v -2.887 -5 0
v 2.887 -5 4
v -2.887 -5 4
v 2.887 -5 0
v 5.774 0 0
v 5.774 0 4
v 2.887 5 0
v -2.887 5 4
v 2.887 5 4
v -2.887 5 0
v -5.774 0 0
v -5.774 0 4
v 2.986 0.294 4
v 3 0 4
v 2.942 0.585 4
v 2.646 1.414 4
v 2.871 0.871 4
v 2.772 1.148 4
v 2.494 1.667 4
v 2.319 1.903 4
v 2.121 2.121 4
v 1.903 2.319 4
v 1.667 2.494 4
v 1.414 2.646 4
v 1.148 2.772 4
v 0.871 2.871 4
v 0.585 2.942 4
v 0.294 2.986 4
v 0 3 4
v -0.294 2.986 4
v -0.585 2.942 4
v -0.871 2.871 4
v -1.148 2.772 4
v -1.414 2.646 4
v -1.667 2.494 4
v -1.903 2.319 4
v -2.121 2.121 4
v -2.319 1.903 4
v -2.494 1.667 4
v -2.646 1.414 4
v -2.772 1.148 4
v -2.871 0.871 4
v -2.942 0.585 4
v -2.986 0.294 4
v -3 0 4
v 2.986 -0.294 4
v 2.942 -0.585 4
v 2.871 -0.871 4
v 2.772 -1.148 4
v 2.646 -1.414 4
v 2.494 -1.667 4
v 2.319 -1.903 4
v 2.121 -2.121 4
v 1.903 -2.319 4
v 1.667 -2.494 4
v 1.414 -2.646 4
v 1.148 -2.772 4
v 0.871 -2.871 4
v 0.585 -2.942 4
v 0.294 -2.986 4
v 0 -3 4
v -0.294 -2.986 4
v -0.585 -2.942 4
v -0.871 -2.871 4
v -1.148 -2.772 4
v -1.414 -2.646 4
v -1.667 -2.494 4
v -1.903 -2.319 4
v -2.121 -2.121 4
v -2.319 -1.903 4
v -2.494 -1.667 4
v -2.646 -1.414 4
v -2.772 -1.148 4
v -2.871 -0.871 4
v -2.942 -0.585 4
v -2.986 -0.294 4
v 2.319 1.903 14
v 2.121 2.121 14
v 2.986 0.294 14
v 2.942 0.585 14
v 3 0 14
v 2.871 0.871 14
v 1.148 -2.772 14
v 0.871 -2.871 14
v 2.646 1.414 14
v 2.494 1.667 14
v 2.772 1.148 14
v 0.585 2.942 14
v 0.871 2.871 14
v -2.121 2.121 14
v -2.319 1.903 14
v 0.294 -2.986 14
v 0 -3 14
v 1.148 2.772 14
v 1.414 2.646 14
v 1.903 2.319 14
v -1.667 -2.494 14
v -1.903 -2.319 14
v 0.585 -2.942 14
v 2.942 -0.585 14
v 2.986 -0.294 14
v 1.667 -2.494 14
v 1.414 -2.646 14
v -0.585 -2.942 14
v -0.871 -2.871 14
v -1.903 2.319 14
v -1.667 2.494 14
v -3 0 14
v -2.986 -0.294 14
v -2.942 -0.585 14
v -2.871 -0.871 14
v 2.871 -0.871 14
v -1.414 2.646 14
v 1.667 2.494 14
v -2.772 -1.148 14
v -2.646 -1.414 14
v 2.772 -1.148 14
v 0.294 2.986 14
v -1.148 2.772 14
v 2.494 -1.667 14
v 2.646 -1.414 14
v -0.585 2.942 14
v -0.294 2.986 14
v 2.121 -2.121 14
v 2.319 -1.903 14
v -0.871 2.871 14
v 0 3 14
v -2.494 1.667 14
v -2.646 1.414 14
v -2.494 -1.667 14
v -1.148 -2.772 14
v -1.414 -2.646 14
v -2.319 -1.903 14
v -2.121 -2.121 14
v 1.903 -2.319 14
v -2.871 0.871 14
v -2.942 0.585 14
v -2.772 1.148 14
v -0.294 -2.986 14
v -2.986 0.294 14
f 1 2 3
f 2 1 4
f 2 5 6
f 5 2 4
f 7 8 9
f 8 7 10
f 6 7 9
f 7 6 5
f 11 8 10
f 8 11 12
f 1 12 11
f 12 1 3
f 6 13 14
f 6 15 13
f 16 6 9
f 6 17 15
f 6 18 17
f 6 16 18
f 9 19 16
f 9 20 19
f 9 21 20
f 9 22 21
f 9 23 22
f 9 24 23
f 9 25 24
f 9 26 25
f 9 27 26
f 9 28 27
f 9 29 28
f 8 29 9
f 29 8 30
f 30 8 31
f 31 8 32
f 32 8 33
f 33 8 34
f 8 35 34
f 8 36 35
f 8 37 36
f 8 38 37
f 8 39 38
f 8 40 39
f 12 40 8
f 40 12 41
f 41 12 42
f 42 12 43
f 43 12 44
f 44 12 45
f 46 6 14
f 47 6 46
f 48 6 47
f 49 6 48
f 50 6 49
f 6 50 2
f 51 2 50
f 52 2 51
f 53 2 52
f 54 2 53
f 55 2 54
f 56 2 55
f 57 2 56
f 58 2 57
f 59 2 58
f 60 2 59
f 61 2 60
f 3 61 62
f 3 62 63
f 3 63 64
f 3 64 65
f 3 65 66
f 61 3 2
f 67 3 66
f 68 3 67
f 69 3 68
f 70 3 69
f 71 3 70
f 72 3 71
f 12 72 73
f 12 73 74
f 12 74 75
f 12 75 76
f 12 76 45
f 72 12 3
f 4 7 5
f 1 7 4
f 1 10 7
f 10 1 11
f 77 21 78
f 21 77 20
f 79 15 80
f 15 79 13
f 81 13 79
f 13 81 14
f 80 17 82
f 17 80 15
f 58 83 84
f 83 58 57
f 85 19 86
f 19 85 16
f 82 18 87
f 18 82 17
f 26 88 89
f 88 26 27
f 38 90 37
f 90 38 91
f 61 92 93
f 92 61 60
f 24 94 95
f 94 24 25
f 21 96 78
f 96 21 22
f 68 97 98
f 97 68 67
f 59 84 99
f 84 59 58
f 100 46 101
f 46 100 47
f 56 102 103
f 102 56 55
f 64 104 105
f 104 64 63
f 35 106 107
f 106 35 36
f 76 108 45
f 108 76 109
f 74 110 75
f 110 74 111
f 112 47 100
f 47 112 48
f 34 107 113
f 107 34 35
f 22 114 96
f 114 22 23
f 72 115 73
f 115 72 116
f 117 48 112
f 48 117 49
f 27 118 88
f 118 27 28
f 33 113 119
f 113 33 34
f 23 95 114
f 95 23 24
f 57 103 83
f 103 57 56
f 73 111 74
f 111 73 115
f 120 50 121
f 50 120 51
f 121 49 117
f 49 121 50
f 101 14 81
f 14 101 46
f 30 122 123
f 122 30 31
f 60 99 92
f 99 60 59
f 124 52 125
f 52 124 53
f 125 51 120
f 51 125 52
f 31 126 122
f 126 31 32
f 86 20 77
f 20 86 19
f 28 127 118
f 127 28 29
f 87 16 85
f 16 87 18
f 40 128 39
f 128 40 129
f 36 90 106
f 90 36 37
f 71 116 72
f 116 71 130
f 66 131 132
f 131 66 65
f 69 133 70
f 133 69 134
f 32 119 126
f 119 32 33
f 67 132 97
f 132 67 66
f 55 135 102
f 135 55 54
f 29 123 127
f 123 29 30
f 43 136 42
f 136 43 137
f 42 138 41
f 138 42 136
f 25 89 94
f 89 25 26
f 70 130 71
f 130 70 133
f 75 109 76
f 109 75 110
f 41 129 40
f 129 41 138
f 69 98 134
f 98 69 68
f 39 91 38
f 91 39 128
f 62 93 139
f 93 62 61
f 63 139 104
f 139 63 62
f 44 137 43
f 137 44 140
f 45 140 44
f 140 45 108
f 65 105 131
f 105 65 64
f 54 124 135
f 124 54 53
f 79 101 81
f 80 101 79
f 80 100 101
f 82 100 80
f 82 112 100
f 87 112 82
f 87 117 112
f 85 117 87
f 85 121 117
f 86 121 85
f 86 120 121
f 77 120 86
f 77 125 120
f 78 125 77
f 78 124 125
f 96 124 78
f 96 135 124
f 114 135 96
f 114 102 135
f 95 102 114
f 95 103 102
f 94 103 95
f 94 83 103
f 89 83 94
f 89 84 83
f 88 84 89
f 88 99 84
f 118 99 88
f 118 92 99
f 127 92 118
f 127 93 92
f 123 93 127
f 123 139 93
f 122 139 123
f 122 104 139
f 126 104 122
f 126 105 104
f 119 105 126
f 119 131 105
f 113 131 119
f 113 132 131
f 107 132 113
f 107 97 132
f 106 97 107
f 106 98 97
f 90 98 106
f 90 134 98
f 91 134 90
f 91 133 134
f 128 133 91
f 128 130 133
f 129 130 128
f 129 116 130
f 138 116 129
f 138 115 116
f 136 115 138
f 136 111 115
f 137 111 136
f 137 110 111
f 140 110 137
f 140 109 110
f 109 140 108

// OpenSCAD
// DIN 933 M6×10 full-thread hex bolt

head_af = 10.0;   // across flats
head_h  =  4.0;   // head height
shaft_d =  6.0;   // shaft diameter
shaft_l = 10.0;   // shaft length (under-head to tip)

$fn = 64;

// Origin at bottom of head; shaft extends upward.
module screw_m6_din933(length = shaft_l) {
    union() {
        cylinder(h = head_h, d = head_af / cos(30), $fn = 6);
        translate([0, 0, head_h])
            cylinder(h = length, d = shaft_d);
    }
}

screw_m6_din933();
